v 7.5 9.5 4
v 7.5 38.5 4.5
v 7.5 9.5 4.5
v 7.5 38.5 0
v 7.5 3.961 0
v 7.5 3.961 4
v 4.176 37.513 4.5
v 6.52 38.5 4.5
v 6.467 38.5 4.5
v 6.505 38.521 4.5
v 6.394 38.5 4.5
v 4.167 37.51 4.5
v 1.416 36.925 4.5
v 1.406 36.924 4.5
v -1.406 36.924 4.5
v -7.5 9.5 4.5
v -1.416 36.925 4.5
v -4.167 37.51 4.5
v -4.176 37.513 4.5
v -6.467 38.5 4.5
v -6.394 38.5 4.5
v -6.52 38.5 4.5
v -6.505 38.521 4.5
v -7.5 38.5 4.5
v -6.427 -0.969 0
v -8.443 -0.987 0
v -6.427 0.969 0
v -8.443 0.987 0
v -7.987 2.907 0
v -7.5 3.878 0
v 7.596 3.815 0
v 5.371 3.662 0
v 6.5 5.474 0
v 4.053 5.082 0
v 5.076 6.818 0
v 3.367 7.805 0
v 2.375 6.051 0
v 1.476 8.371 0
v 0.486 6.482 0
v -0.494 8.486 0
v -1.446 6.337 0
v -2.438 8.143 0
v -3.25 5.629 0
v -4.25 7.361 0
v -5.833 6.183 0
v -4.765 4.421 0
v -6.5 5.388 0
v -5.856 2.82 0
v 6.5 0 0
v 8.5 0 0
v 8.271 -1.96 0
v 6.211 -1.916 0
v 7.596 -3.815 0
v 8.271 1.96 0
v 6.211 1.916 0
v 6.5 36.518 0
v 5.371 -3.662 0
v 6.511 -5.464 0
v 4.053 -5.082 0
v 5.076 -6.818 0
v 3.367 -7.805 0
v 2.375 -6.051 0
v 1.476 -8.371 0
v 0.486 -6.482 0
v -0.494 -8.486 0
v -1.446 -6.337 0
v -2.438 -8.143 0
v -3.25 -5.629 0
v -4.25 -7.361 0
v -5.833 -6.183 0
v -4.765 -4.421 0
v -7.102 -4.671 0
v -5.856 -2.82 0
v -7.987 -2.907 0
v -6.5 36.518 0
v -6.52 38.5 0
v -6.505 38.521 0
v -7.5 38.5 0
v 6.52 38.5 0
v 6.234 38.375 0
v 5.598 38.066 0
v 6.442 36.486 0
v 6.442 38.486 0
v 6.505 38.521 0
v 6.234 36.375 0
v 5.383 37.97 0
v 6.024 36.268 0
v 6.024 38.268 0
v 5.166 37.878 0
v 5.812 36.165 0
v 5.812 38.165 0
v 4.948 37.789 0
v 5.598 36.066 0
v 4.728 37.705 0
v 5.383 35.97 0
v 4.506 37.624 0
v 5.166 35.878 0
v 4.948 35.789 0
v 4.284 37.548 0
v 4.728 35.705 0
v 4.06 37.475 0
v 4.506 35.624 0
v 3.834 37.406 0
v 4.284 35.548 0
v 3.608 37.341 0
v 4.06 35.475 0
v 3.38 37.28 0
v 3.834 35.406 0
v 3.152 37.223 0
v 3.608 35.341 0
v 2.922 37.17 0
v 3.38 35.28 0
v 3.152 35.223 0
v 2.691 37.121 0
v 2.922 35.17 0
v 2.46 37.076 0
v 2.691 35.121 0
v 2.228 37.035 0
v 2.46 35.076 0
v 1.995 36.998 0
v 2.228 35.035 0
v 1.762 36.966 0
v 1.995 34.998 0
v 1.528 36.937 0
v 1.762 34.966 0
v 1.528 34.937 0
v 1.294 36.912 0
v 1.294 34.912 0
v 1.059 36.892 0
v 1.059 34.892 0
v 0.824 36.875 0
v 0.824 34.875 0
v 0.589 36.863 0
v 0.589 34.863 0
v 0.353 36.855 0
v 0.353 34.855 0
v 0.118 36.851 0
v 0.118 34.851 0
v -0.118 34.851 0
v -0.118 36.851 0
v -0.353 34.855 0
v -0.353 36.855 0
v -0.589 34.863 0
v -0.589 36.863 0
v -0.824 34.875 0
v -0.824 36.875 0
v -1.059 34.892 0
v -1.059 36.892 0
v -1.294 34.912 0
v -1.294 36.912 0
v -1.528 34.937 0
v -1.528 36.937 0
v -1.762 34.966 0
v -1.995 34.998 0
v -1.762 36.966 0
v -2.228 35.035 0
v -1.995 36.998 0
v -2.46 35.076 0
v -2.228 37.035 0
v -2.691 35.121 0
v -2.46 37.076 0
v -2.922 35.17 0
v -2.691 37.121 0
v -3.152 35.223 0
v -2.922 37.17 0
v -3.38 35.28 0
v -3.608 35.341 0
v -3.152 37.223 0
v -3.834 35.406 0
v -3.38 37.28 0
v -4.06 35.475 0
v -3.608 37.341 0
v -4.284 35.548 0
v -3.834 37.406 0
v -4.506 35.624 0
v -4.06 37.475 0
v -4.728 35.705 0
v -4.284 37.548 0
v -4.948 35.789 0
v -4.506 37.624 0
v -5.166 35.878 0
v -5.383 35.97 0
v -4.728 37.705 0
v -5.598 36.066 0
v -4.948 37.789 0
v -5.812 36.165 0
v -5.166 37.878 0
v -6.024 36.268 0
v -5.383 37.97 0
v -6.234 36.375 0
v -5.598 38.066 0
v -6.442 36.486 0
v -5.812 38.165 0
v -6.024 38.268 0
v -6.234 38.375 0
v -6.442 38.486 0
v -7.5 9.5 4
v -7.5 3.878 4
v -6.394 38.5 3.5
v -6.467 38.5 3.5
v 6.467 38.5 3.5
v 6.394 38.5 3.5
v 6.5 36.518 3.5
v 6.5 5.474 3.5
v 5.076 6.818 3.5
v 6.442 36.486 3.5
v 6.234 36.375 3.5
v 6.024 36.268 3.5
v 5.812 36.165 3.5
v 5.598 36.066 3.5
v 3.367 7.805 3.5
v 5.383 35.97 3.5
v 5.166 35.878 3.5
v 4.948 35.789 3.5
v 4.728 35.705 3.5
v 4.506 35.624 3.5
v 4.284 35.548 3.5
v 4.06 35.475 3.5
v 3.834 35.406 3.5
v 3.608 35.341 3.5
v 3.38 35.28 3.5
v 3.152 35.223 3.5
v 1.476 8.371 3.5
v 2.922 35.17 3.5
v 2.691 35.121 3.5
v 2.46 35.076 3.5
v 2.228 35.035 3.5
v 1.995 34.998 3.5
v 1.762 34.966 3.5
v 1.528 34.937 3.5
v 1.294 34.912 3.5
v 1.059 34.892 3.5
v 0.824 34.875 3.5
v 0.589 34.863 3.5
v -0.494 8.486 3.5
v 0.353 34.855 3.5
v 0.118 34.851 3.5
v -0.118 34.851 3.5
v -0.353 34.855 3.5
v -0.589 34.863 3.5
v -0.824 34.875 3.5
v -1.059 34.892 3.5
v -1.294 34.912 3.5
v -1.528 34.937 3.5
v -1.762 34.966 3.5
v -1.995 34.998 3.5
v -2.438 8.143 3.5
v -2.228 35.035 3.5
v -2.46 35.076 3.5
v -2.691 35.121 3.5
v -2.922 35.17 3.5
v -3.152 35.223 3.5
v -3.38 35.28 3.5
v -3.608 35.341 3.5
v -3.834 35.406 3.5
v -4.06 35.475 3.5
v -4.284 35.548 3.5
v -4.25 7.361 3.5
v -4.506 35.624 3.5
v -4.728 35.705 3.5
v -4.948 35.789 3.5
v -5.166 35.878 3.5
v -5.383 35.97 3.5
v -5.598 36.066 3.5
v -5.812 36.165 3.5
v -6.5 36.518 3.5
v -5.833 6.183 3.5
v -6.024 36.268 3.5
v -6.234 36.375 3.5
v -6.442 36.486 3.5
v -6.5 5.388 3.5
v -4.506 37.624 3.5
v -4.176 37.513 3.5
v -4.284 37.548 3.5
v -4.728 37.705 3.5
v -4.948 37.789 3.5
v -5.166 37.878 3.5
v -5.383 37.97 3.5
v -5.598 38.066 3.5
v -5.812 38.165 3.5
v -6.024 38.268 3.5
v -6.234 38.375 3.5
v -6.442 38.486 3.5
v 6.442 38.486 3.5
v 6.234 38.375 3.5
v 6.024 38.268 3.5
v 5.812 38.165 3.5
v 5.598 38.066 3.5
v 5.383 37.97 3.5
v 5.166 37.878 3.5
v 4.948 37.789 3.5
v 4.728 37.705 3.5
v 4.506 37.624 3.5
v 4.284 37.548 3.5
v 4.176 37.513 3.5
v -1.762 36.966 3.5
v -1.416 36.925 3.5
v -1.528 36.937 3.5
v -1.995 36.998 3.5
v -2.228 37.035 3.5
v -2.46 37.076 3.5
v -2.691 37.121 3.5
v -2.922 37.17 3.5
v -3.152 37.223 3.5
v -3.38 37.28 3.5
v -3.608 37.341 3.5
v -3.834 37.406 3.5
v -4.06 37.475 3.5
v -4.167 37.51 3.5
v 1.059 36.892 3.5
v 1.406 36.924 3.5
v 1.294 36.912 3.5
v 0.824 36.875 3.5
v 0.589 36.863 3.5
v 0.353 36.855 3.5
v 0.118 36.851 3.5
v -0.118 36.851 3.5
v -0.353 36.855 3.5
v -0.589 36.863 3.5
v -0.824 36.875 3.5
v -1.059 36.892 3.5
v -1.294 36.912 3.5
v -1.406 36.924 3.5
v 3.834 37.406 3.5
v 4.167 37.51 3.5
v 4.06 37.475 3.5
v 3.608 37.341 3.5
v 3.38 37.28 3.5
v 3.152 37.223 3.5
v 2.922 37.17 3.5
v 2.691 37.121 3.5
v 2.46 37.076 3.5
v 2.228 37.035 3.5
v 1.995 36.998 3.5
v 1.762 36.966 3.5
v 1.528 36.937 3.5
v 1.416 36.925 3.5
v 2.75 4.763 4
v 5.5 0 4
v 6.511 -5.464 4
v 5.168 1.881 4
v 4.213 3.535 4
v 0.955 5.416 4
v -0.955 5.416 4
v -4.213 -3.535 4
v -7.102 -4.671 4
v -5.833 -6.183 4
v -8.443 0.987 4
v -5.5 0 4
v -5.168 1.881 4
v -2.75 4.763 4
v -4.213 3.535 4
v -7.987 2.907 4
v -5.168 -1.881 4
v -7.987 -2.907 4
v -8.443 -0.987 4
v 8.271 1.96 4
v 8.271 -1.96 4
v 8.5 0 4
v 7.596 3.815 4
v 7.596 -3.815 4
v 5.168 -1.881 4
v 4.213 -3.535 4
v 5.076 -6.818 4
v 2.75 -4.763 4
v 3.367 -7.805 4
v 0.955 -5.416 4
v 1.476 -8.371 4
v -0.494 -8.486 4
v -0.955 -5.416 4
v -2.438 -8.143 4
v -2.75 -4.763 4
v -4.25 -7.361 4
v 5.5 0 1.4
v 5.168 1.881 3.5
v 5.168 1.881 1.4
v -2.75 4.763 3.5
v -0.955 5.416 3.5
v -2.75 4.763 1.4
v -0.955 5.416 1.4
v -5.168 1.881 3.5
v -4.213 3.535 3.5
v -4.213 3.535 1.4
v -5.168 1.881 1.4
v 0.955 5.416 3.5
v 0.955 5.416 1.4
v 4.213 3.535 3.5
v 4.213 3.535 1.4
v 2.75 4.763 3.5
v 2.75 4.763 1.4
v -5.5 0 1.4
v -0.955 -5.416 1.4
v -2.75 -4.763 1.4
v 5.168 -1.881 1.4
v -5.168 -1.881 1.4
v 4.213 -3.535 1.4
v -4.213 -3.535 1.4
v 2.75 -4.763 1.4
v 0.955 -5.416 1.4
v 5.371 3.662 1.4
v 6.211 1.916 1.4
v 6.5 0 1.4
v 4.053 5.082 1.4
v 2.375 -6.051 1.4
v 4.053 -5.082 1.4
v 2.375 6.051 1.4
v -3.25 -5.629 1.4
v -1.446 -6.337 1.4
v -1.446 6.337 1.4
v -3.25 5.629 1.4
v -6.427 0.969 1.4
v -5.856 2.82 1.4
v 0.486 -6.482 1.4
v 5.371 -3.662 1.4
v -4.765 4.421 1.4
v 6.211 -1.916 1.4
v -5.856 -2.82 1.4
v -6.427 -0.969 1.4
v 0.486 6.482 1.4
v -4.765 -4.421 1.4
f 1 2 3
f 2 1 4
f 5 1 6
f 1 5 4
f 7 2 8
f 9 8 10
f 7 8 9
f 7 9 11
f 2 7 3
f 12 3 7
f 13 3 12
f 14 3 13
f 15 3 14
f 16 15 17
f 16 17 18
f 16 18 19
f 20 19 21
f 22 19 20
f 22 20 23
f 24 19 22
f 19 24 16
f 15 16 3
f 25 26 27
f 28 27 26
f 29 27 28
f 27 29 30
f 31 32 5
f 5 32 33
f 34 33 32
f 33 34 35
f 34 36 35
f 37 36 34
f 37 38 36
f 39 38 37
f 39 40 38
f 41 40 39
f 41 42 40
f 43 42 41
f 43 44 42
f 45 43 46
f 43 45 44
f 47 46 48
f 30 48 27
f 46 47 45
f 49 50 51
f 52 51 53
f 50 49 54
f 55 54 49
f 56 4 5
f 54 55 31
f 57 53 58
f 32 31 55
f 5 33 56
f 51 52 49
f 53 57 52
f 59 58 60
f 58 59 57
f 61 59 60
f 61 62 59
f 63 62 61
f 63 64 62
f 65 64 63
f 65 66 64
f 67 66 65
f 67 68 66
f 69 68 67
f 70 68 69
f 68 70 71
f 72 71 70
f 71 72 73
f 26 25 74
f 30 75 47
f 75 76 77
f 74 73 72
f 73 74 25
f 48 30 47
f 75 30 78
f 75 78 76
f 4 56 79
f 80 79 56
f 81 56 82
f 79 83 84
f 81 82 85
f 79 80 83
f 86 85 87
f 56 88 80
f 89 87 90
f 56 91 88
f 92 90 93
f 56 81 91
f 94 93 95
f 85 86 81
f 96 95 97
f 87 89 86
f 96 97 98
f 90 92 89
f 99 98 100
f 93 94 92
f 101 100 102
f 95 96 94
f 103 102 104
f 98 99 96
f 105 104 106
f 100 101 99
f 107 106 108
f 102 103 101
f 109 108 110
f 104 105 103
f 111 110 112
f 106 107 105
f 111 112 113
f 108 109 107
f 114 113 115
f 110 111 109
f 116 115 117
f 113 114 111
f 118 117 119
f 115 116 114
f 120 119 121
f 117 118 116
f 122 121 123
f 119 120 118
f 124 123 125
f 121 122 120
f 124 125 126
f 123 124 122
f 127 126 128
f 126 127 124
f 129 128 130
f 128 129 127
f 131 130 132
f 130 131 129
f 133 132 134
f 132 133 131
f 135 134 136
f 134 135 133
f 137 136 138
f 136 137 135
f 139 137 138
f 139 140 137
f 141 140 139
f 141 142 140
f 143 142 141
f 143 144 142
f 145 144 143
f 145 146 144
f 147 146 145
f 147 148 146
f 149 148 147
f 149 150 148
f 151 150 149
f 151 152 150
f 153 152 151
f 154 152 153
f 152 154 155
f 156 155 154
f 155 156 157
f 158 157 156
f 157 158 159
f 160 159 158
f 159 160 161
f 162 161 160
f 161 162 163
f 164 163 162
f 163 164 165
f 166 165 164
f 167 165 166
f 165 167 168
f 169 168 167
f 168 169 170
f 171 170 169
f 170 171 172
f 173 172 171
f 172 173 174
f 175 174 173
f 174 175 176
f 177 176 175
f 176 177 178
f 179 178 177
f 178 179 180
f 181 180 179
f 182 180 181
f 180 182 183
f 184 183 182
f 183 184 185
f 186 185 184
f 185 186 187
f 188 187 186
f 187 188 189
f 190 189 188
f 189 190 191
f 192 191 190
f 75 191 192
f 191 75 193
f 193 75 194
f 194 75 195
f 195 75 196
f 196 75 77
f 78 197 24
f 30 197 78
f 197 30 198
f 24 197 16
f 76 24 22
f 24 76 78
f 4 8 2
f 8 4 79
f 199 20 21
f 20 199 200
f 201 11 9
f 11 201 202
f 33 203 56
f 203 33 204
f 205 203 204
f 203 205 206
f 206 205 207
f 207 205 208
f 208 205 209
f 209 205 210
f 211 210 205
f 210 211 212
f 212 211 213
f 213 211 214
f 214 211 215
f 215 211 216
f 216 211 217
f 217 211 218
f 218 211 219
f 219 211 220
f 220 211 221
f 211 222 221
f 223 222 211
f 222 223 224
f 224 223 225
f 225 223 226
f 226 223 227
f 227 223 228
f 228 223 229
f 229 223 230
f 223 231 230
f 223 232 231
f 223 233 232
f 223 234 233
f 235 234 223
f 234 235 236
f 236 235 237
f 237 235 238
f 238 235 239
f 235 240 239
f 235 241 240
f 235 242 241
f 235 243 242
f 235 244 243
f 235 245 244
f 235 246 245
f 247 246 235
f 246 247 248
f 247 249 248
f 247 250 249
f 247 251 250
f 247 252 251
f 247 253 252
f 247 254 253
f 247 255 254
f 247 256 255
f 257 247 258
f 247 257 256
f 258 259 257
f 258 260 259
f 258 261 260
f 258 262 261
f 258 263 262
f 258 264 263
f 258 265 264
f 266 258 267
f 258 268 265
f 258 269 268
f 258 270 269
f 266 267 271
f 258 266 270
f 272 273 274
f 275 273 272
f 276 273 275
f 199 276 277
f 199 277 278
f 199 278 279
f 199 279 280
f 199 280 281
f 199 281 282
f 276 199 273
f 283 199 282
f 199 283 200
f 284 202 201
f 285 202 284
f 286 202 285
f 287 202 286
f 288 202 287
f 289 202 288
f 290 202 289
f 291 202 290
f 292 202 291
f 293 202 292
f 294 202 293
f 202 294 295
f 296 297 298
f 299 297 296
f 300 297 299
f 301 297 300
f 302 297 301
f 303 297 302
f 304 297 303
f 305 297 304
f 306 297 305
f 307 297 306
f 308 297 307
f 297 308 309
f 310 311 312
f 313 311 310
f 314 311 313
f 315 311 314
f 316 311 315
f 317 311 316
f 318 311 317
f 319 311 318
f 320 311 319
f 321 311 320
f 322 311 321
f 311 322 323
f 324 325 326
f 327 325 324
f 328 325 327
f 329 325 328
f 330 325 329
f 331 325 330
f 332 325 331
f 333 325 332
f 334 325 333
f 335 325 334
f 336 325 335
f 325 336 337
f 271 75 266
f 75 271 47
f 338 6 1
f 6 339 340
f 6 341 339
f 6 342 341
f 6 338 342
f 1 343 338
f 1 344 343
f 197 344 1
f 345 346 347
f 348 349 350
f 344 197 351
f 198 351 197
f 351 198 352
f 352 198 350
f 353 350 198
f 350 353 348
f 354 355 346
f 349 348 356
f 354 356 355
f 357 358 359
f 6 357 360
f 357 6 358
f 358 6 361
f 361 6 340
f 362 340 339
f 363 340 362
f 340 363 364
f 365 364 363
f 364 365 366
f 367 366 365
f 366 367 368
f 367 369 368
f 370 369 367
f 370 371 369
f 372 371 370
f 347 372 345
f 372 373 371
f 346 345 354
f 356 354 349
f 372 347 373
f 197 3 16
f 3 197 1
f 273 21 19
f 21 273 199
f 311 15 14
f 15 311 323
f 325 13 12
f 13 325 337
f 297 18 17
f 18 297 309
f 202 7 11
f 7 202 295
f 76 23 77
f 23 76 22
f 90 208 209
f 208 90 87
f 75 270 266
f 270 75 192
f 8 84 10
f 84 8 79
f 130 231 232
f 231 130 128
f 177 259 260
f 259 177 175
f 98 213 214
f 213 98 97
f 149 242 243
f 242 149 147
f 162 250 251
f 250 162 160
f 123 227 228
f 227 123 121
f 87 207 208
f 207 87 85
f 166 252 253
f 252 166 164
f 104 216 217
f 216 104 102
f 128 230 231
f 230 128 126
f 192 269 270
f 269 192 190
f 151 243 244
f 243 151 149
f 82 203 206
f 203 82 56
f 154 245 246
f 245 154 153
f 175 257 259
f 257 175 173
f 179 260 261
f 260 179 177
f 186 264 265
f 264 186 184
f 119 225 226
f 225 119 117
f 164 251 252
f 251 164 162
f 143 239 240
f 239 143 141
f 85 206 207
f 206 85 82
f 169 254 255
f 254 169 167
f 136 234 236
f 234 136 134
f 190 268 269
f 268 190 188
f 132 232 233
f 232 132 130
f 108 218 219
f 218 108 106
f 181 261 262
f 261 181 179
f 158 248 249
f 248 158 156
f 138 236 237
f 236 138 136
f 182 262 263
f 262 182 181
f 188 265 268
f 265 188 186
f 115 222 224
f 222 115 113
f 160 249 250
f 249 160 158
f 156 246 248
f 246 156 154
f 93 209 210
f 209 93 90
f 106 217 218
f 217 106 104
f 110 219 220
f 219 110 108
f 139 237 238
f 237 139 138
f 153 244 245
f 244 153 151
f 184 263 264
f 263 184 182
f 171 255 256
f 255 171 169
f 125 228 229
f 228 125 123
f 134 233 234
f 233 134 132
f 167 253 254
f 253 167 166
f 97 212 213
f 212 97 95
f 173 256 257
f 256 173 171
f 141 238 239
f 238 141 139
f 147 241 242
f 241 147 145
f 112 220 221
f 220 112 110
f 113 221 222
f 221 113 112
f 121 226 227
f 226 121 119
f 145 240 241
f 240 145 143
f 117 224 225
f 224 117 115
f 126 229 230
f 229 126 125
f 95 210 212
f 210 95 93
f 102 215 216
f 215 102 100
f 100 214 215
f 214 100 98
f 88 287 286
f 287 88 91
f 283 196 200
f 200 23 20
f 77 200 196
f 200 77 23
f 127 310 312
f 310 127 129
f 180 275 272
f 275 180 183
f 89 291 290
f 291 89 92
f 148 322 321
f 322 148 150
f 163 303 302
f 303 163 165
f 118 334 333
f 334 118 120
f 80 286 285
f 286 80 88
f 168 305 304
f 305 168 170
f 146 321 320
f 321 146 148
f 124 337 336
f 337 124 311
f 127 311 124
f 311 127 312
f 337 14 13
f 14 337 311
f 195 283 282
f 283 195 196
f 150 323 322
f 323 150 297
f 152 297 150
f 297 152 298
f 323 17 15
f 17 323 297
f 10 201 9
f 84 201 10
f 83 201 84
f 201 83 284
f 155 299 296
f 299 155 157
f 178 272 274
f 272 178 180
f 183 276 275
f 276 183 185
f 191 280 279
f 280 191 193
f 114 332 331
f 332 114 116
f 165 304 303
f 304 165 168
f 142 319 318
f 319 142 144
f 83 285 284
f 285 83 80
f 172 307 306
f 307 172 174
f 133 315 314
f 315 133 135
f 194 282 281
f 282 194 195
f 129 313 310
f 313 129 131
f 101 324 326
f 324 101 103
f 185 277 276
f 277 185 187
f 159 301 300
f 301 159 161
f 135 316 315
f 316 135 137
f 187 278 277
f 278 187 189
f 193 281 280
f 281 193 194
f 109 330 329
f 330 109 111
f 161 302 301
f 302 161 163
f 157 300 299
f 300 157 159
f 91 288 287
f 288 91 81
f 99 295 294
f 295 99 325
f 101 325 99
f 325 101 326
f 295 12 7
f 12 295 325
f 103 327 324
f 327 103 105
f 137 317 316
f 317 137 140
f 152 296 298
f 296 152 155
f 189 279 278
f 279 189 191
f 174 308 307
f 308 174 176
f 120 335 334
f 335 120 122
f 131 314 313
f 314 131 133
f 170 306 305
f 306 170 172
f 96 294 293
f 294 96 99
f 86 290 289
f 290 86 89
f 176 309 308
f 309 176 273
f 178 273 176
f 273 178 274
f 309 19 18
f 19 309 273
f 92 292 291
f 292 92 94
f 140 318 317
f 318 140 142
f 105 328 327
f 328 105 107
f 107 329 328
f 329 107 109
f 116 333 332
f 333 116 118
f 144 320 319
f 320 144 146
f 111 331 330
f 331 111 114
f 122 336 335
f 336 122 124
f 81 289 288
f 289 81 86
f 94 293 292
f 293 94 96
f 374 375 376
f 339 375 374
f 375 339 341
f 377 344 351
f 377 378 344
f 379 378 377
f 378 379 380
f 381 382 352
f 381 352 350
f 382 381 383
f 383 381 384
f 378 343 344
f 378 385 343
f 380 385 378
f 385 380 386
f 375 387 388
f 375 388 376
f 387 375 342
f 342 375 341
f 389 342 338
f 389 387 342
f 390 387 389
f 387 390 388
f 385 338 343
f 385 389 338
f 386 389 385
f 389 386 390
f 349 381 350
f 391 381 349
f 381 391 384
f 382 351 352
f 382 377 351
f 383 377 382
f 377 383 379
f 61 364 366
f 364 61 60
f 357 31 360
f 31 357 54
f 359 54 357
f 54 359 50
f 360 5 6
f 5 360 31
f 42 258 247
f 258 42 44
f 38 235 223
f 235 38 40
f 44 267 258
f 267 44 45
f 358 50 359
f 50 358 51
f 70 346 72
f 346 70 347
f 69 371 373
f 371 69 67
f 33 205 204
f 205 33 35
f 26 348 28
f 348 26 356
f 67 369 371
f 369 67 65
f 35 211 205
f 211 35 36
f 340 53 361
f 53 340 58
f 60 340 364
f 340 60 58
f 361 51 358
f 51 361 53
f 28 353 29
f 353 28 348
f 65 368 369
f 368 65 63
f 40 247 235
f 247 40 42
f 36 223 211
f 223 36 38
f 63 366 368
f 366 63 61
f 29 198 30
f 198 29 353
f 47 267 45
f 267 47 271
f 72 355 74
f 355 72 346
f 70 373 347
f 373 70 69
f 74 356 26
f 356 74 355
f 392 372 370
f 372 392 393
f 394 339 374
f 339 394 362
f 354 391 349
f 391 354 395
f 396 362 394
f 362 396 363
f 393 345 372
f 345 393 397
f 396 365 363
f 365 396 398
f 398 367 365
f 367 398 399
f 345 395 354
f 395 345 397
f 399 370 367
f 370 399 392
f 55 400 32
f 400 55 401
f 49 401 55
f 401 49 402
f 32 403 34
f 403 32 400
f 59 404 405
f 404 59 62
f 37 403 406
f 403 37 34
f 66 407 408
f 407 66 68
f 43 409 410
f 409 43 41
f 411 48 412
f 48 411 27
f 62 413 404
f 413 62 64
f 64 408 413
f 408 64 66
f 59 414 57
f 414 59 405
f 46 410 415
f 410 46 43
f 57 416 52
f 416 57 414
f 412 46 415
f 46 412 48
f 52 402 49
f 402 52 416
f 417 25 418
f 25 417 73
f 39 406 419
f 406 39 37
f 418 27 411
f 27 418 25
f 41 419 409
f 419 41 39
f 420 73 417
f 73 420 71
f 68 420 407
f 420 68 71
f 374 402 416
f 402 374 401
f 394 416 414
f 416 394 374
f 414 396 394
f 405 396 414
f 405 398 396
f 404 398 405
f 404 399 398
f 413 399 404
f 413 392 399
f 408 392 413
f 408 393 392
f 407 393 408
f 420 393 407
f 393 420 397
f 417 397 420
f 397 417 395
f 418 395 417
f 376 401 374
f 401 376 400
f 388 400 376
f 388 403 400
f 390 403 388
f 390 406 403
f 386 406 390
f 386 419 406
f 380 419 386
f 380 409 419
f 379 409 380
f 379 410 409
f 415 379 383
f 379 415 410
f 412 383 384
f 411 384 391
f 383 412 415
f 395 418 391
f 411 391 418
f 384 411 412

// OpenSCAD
// file: Movement_Ruler_lib.scad
function get_movement_ruler_width() = 15;
function get_movement_1_bottom_ruler_length() = 30;
function get_movement_1_top_ruler_length() = 34;

function get_movement_ruler_height() = 4.5;
function get_movement_ruler_pocket_depth() = 3.5;

function get_pivot_outer_rad() = 8.5;
function get_pivot_inner_rad() = 11/2;
function get_pivot_second_inner_rad() = 13/2;

function get_ruler_ridge_length() = 2;

function get_bottom_ruler_indent() = 0.5;

function get_pivot_second_inner_bottom_offset() = 1.5;

function get_miniture_base_rad() = 27/2;

module circle_slice(rad = get_miniture_base_rad(), ang = 60){
    radius = rad;
    angle = ang;   // degrees

    polygon(points = concat(
        [[0,0]],
        [ for (a = [0:1:angle])
            [ radius * cos(a), radius * sin(a) ]
        ]
    ));
}
// main file
use <Movement_Ruler_lib.scad>;
movement_ruler_width = get_movement_ruler_width();
movement_ruler_length = get_movement_1_bottom_ruler_length(); //should be 30

movement_ruler_height = get_movement_ruler_height();
movement_ruler_pocket_depth = get_movement_ruler_pocket_depth();

pivot_outer_rad = get_pivot_outer_rad();
pivot_inner_rad = get_pivot_inner_rad();
pivot_second_inner_rad = get_pivot_second_inner_rad();

ruler_ridge_length = get_ruler_ridge_length();

bottom_ruler_indent = get_bottom_ruler_indent();

pivot_second_inner_bottom_offset = get_pivot_second_inner_bottom_offset();

miniture_base_rad = get_miniture_base_rad();

//bottom ruler piece
difference(){
    translate([-movement_ruler_width/2,0,0]){
    difference(){
        cube([ movement_ruler_width, movement_ruler_length+pivot_outer_rad, movement_ruler_height]);
        //Bottom large indent
        translate([1,-.01,-1])cube([movement_ruler_width-ruler_ridge_length, movement_ruler_length+pivot_outer_rad+0.2, movement_ruler_pocket_depth+1]);
        //top shallow indent for pivot piece
        translate([-1,-movement_ruler_length,movement_ruler_height-bottom_ruler_indent])cube([movement_ruler_width+2, movement_ruler_length+pivot_outer_rad+1, bottom_ruler_indent+0.1]);
        translate([movement_ruler_width/2,movement_ruler_length+pivot_outer_rad+2.4+(miniture_base_rad*.7),-1])cylinder(h=movement_ruler_height+2,r=miniture_base_rad);
        }
        
         difference(){
            translate([movement_ruler_width/2,movement_ruler_length+pivot_outer_rad+2.4+(miniture_base_rad*0.7)-2,0])rotate([0,0,-123.5])linear_extrude(movement_ruler_height)circle_slice(rad=miniture_base_rad,ang=67);
            translate([movement_ruler_width/2,movement_ruler_length+pivot_outer_rad+2.4+(miniture_base_rad*0.7),-1.9])rotate([0,0,-123.5])linear_extrude(movement_ruler_height+2)circle_slice(rad=miniture_base_rad,ang=67);
            }
        //translate([-1,0,movement_ruler_height-bottom_ruler_indent+0.1])cube([movement_ruler_width+2, movement_ruler_length+pivot_outer_rad+0.2, bottom_ruler_indent]);
    }
    //larger inner circle which punches through the top
    translate([0,0,-0.1])cylinder(h=movement_ruler_height,r=pivot_inner_rad);
}
difference(){
    cylinder(h=movement_ruler_height,r=pivot_outer_rad);
    //larger inner circle which punches through the top
    translate([0,0,-0.1])cylinder(h=movement_ruler_height,r=pivot_inner_rad);
    //smaller inner circle
    translate([0,0,-0.1])cylinder(h=pivot_second_inner_bottom_offset,r=pivot_second_inner_rad);
    
    //top shallow indent for pivot piece
    translate([0,0,movement_ruler_height-bottom_ruler_indent])cylinder(h=bottom_ruler_indent+0.1,r=pivot_outer_rad+0.1);
}
